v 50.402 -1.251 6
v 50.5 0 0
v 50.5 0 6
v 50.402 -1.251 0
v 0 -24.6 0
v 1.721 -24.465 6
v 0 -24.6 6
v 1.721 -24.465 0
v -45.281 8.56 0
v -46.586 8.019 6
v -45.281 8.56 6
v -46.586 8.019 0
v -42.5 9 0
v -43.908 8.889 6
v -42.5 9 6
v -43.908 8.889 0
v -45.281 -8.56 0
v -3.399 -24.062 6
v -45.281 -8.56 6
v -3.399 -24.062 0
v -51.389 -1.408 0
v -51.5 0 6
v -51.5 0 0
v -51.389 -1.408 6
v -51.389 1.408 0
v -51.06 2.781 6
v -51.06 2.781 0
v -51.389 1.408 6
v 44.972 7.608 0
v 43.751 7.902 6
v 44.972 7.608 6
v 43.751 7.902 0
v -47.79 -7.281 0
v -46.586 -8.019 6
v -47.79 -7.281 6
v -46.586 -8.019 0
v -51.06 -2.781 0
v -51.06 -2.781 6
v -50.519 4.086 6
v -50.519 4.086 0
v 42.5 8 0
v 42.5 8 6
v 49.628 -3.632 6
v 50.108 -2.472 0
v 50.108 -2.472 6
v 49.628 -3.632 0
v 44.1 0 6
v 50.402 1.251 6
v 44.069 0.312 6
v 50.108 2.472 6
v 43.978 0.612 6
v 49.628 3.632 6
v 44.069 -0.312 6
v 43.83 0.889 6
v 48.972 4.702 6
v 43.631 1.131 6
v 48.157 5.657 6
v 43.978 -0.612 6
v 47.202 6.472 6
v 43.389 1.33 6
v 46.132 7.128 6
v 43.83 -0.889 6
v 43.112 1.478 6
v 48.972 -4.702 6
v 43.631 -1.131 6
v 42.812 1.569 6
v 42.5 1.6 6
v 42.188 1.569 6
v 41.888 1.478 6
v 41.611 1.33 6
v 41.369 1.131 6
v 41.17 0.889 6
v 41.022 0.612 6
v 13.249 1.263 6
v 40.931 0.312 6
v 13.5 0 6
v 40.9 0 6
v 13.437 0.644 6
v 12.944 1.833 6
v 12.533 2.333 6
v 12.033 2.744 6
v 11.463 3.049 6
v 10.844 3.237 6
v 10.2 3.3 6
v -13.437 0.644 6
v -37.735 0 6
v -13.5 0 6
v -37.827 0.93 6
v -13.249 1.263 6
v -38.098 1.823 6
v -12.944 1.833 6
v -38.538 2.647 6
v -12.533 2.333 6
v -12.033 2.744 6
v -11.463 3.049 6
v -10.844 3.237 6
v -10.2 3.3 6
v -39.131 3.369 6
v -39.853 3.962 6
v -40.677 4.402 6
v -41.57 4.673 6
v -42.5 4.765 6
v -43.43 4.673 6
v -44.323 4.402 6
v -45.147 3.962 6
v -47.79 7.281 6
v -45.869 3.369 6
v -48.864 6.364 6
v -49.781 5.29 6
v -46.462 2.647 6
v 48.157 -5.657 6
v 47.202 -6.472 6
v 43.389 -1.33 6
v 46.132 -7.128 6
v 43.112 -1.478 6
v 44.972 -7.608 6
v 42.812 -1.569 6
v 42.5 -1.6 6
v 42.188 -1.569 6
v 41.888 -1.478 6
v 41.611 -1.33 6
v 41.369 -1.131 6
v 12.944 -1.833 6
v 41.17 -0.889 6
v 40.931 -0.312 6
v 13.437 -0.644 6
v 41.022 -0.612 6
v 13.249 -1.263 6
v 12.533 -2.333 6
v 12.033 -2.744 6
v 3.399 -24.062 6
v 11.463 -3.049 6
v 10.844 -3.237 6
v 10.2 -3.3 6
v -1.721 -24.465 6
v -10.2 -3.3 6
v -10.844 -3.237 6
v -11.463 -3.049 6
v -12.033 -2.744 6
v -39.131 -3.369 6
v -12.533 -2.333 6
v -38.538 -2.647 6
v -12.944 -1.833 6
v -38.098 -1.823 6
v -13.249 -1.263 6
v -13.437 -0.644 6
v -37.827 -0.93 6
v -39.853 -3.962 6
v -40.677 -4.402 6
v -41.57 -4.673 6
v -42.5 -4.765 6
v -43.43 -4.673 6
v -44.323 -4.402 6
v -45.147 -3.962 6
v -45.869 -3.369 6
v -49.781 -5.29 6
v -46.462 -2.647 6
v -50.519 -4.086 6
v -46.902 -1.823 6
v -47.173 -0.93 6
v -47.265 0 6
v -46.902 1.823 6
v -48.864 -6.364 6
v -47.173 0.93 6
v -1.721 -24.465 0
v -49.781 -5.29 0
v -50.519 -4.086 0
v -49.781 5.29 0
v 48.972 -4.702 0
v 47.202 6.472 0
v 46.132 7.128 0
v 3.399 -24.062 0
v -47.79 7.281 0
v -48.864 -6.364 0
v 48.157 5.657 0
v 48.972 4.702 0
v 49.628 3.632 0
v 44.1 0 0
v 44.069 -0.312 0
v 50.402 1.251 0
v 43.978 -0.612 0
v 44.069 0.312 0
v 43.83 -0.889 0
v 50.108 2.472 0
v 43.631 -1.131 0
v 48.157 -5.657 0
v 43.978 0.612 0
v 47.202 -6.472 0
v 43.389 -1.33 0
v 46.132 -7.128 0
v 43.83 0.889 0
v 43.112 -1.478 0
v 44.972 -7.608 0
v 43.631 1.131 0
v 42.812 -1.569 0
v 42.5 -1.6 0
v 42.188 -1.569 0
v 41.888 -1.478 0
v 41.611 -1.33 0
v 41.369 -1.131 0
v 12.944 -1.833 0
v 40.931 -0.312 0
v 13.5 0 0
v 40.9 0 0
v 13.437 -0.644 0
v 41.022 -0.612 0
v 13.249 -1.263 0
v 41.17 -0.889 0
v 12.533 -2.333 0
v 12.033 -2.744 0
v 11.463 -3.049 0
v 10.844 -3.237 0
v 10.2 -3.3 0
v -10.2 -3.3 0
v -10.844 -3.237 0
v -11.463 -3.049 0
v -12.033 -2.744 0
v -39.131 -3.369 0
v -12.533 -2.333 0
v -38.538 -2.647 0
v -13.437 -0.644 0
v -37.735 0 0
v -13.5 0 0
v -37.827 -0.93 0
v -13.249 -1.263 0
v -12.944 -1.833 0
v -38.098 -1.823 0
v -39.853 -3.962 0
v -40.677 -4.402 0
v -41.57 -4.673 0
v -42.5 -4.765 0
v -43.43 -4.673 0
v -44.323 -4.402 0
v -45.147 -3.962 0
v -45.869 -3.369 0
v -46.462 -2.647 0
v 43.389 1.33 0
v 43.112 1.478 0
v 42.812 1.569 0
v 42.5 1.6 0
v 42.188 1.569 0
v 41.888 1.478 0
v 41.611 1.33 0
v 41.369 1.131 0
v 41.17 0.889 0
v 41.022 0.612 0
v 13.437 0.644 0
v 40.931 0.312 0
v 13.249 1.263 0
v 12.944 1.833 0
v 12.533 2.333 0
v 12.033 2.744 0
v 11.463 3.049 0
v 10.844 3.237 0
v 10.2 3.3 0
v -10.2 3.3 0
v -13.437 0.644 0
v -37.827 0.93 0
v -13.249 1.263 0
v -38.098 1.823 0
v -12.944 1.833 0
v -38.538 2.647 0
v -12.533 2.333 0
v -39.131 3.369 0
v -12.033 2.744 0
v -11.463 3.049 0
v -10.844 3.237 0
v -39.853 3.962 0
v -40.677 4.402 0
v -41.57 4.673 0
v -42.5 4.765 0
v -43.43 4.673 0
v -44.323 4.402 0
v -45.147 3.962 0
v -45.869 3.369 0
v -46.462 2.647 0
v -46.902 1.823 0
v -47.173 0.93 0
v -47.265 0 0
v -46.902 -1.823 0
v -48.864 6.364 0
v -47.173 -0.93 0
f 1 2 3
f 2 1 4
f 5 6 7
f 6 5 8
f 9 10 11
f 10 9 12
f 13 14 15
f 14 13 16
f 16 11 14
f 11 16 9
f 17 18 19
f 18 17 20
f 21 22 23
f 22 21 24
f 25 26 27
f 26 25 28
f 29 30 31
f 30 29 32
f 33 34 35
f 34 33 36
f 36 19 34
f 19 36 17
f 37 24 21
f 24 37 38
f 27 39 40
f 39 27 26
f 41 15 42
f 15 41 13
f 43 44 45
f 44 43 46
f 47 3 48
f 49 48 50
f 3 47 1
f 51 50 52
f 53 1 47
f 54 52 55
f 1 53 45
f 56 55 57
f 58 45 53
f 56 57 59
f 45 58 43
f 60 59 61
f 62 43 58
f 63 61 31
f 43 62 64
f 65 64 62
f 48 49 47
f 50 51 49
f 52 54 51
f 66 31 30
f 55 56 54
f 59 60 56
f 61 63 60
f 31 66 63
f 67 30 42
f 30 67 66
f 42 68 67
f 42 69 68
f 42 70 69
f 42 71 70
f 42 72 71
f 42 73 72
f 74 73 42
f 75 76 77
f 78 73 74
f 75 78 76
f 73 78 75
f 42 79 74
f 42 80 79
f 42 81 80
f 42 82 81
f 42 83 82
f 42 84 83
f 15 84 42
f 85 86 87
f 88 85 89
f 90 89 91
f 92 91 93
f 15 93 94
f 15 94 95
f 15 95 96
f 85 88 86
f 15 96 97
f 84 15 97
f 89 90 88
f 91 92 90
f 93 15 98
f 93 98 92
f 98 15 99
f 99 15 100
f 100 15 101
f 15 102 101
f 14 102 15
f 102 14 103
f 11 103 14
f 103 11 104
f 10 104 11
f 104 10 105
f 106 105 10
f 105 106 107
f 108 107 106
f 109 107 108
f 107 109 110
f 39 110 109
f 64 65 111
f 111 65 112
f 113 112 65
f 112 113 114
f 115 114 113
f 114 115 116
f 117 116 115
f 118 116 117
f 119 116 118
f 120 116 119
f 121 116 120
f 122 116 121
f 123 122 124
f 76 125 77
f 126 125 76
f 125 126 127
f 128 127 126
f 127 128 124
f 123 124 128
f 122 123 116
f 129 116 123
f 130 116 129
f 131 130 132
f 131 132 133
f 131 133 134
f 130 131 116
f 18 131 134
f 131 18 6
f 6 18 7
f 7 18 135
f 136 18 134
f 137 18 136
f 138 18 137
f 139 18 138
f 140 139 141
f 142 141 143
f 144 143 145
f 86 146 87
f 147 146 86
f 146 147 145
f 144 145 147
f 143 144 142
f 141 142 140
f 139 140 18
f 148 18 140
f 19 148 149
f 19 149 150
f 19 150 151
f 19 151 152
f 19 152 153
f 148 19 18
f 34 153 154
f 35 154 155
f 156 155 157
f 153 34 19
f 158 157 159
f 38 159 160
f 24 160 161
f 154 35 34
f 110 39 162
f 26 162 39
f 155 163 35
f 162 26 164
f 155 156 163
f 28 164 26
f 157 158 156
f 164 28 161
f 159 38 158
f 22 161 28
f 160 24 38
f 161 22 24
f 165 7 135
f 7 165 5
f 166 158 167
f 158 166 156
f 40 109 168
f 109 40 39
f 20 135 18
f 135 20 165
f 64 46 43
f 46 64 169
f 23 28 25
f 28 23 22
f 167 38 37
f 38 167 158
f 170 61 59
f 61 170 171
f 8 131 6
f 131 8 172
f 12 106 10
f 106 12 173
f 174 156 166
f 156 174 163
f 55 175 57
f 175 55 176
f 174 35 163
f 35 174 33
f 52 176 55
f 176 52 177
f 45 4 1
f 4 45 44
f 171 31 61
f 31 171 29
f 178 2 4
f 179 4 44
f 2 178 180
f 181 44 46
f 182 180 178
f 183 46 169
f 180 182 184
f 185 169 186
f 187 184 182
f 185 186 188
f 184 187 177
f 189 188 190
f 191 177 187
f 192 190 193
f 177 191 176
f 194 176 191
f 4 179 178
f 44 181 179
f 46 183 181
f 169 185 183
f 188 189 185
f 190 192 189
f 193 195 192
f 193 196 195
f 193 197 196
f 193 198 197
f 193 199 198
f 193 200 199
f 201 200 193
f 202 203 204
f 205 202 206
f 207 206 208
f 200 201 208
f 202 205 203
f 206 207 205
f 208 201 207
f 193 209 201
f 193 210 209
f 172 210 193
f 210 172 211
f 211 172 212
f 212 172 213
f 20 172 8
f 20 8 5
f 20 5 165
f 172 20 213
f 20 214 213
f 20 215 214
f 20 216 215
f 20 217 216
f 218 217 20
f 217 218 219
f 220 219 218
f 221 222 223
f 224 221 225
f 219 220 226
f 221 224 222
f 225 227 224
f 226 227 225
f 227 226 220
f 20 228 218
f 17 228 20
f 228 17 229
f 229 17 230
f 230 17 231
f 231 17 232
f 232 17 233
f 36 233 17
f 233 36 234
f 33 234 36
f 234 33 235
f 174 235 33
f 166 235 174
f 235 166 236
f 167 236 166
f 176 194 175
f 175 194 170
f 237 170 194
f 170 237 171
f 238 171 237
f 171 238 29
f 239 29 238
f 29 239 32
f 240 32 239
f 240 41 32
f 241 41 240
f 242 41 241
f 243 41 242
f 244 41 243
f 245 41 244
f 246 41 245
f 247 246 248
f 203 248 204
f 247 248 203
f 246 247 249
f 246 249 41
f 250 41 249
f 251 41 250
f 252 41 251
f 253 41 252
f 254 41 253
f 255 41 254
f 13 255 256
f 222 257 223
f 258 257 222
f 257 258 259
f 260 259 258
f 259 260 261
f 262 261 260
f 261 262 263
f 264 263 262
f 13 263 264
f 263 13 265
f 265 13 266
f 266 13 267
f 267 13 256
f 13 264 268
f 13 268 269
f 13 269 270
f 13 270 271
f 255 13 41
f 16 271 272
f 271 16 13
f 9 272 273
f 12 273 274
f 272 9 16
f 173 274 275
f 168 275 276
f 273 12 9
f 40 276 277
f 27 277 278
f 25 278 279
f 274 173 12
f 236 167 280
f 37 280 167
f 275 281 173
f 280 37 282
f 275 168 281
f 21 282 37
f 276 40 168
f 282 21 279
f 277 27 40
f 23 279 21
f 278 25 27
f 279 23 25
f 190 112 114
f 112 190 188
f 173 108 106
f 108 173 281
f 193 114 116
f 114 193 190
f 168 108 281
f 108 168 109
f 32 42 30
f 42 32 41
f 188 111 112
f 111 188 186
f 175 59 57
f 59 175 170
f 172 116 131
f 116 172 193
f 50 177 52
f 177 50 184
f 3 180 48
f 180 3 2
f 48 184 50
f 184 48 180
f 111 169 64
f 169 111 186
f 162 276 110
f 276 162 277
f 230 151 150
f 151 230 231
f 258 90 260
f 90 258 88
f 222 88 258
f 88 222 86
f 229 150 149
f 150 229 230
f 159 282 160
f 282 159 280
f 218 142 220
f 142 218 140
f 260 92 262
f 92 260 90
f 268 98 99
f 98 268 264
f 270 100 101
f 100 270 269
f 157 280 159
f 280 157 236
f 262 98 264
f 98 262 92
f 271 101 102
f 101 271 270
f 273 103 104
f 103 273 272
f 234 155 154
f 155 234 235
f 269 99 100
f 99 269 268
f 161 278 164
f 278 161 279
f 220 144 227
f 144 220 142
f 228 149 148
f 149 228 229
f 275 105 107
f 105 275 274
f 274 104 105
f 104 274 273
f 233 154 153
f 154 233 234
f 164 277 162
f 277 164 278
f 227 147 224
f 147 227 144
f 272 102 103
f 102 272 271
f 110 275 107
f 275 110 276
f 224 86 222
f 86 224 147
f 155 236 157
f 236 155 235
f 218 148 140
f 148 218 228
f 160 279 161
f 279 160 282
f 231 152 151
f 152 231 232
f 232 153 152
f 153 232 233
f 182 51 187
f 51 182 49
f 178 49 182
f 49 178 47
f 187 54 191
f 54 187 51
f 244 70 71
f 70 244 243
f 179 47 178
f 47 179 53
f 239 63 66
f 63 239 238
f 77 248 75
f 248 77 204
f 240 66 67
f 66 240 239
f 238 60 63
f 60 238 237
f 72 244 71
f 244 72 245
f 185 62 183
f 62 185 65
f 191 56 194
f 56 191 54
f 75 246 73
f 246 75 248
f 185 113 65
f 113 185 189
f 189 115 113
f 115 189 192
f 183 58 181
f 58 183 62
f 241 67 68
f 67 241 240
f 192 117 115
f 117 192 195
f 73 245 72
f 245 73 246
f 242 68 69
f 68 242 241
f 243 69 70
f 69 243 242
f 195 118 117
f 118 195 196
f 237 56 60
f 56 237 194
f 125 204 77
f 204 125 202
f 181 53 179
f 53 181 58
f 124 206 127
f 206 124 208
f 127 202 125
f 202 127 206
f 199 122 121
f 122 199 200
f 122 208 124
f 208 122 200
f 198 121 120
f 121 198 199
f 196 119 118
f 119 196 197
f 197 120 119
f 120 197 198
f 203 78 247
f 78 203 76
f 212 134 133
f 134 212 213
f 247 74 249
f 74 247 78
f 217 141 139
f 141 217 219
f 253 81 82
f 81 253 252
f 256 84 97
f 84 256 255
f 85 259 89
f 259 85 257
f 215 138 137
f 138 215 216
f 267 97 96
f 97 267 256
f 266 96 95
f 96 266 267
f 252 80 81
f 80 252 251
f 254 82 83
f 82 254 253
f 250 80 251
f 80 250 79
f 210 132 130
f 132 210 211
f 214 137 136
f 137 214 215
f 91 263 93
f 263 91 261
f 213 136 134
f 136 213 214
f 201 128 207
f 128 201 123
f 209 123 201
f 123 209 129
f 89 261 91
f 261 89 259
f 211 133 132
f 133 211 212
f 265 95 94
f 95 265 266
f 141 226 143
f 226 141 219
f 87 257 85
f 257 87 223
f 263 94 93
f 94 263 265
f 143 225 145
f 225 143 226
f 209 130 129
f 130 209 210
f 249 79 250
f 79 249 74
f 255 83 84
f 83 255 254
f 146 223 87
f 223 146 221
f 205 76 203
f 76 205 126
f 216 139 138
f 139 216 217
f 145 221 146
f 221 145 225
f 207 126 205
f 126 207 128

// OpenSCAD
$fn = 32;

// ----------------------------------------------------------------------
// Lever: 85 mm between the bosses, 6 mm thick, smooth outline
// ----------------------------------------------------------------------

// --- parameters (mm) ---
lever_l = 85;             // distance between the boss centres
boss_a = 18;              // first boss diameter
boss_b = 16;              // second boss diameter
bore_a = 9.53;            // first bore
bore_b = 3.2;             // second bore
lever_t = 6;              // lever thickness
boss_c = 22;              // middle boss diameter
bend = 13.6;              // how far the middle boss drops
slot_w = 6.6;             // adjustment slot width

lever_profile = [[-51.5, 0], [-51.389, -1.408], [-51.06, -2.781], [-50.519, -4.086], [-49.781, -5.29], [-48.864, -6.364], [-47.79, -7.281], [-46.586, -8.019], [-45.281, -8.56], [-3.399, -24.062], [-1.721, -24.465], [0, -24.6], [1.721, -24.465], [3.399, -24.062], [44.972, -7.608], [46.132, -7.128], [47.202, -6.472], [48.157, -5.657], [48.972, -4.702], [49.628, -3.632], [50.108, -2.472], [50.402, -1.251], [50.5, 0], [50.402, 1.251], [50.108, 2.472], [49.628, 3.632], [48.972, 4.702], [48.157, 5.657], [47.202, 6.472], [46.132, 7.128], [44.972, 7.608], [43.751, 7.902], [42.5, 8], [-42.5, 9], [-43.908, 8.889], [-45.281, 8.56], [-46.586, 8.019], [-47.79, 7.281], [-48.864, 6.364], [-49.781, 5.29], [-50.519, 4.086], [-51.06, 2.781], [-51.389, 1.408]];

difference() {
  linear_extrude(height = lever_t) polygon(lever_profile);
  translate([-42.5, 0, -2.5]) cylinder(h = lever_t + 5, d = bore_a);
  translate([42.5, 0, -2.5]) cylinder(h = lever_t + 5, d = bore_b);
  /* slotted adjustment, stadium shaped */
  hull() {
    translate([-10.2, 0, -2.5]) cylinder(h = lever_t + 5, d = slot_w);
    translate([10.2, 0, -2.5]) cylinder(h = lever_t + 5, d = slot_w);
  }
}
